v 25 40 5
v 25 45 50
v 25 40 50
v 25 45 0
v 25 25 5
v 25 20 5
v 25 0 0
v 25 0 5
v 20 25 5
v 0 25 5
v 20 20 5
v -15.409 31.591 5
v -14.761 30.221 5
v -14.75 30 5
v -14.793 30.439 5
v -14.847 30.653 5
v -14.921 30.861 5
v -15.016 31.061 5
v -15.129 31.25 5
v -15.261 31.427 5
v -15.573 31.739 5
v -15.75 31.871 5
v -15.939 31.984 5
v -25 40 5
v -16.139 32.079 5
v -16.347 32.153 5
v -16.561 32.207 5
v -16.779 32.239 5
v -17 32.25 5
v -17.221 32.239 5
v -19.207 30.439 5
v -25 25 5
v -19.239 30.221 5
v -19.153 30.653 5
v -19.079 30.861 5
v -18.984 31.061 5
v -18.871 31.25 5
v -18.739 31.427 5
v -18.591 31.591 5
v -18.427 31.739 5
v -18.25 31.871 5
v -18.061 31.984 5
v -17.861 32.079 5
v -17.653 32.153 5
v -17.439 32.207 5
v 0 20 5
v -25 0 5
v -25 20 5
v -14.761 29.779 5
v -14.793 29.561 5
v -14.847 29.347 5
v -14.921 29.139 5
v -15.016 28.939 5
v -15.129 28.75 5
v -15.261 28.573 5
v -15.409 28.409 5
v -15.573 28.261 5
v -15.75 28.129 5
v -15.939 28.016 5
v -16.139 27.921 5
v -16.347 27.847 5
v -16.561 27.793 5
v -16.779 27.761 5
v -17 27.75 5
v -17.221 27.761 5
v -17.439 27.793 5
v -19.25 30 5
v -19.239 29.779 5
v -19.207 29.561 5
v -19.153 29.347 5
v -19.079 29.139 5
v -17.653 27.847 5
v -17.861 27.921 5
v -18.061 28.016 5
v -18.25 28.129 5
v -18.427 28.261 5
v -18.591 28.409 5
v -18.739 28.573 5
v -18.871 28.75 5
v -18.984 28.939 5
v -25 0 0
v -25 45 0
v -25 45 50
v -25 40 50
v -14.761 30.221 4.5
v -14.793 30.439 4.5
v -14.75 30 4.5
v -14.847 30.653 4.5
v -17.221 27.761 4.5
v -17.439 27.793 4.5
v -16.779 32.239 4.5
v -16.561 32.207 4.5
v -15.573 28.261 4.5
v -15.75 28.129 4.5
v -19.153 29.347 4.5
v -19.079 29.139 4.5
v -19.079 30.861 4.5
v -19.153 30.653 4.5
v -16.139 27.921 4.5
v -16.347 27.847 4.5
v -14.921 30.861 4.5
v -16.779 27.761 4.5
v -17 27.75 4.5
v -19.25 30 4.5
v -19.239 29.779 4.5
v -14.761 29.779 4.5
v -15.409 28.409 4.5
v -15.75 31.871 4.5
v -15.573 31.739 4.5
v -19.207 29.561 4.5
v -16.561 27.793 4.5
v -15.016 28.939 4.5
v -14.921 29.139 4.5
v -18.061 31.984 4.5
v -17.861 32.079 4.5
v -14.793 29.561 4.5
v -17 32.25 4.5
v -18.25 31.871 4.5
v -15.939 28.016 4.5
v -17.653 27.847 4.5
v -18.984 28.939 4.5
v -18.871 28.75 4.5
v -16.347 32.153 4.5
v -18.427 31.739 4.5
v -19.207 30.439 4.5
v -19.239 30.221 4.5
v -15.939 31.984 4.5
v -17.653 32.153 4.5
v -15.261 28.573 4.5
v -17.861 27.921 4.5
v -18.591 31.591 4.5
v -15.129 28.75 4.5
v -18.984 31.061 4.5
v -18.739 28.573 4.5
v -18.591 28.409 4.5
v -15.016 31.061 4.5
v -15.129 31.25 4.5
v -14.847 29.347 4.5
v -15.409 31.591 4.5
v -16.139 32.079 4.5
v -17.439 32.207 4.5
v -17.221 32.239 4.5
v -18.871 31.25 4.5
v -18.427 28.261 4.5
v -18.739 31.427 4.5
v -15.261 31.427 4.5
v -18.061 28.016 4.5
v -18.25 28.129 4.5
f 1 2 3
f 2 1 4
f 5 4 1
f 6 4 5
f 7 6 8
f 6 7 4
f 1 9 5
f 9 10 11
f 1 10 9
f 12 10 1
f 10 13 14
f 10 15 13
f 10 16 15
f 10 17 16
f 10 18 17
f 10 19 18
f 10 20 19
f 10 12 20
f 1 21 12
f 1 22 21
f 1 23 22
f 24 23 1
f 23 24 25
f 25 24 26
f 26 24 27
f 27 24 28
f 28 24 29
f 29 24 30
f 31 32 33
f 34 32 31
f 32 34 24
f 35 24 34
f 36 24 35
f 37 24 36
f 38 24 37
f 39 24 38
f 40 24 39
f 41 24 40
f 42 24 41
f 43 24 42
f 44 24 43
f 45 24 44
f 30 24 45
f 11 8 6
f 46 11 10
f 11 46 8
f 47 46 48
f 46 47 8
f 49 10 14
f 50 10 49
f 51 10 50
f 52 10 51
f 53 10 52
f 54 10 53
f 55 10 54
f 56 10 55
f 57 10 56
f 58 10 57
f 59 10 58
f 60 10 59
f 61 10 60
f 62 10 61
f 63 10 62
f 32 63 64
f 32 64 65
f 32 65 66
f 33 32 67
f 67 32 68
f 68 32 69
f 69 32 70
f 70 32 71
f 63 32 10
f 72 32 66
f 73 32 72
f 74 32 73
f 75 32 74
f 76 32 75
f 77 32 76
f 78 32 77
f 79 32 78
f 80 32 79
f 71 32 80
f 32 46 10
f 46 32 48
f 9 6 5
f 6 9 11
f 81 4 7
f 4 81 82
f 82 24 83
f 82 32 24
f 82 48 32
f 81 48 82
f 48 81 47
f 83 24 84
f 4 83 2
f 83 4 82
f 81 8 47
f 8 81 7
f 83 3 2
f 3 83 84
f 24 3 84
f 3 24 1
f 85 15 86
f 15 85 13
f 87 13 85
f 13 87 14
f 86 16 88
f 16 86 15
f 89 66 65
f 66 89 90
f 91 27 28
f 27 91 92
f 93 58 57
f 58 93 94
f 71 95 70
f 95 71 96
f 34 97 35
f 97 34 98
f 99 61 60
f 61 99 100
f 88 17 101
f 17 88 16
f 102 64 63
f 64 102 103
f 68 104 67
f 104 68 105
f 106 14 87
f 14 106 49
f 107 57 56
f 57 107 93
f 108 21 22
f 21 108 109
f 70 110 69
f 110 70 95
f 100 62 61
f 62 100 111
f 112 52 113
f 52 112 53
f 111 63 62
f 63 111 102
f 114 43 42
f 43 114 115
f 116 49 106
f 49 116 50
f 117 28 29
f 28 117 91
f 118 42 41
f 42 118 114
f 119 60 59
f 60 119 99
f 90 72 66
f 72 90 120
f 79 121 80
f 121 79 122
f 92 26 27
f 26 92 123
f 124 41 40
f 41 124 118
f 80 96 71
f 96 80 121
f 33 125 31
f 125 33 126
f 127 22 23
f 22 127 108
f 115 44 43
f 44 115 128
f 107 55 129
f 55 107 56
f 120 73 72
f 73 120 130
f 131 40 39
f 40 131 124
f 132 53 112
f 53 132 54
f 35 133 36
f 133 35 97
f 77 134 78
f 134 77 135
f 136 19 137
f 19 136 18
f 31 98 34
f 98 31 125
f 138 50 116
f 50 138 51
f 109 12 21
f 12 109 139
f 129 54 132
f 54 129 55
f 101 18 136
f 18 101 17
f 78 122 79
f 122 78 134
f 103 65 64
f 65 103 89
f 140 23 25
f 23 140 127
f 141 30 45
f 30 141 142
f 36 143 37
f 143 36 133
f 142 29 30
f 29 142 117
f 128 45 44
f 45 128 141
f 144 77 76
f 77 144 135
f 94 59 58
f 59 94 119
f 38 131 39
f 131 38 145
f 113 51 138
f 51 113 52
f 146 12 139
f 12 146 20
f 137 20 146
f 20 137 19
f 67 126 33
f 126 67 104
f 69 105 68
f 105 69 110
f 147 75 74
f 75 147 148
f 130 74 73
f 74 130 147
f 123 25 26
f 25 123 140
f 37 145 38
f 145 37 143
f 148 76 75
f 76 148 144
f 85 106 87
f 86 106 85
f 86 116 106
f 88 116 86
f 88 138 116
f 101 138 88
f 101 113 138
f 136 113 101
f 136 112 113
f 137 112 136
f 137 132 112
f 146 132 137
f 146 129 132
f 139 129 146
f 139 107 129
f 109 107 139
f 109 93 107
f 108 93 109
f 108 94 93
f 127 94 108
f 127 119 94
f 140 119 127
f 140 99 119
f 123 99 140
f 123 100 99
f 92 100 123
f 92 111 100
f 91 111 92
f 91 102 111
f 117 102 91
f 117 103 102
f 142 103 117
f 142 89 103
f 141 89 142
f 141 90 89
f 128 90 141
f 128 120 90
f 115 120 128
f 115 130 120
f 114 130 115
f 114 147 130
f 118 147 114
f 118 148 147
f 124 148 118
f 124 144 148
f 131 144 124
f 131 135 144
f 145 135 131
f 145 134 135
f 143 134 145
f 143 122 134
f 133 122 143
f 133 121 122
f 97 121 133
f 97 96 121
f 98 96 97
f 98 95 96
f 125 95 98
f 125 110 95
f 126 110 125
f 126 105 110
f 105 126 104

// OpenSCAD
// L-shaped mounting bracket for NEMA 17 stepper motor
// Print orientation: base plate on bed, motor plate builds upward (+Z)

// ---------------- Parameters ----------------
plate_x       = 25;    // base plate half-width (X)
plate_y       = 45;    // base plate length (Y)
plate_t       = 5;     // base plate thickness (Z)

motor_h       = 50;    // motor plate height (Z)
motor_w       = 5;     // motor plate thickness (Y)

boss_d        = 23;    // motor boss hole diameter
boss_x        = 0;     // boss hole centre X
boss_z        = 28;    // boss hole centre Z

screw_d       = 3.4;   // M3 screw hole diameter
screw_pattern = 31;    // square pitch of screw holes
screw_count   = 4;     // number of screw holes

gusset_t      = 5;     // gusset thickness (X)
gusset_leg    = 20;    // right-triangle leg length (Y and Z)
gusset_x      = [-25, -20, 20, 25]; // gusset X positions (flush edges)

eps           = 0.5;   // cutter overshoot past faces
$fn           = 96;    // curve resolution

// ---------------- Model ----------------
difference() {
    union() {
        // Base plate
        translate([-plate_x, 0, 0])
            cube([plate_x * 2, plate_y, plate_t]);

        // Vertical motor plate
        translate([-plate_x, plate_y - motor_w, 0])
            cube([plate_x * 2, motor_w, motor_h]);
    }

    // Base plate through-holes (M4)
    for (h = [plate_t + eps, plate_t - eps])
        translate([-17, 30, h])
            cylinder(d = 4.5, h = 2 * eps, $fn = 64);

    // Motor boss hole (along Y) and screw holes (square pattern)
    translate([boss_x, plate_y - motor_w - eps, boss_z])
        rotate([90, 0, 0]) {
            difference() {
                cylinder(d = boss_d, h = motor_w + 2 * eps);
                for (i = [0 : screw_count - 1])
                    for (j = [0 : screw_count - 1])
                        translate([(i - (screw_count - 1) / 2) * screw_pattern,
                                   (j - (screw_count - 1) / 2) * screw_pattern,
                                   0])
                            cylinder(d = screw_d, h = motor_w + 2 * eps);
            }
        }

    // Triangular gussets, flush with left and right edges
    for (gx = gusset_x)
        translate([gx, plate_y - gusset_leg, gusset_t])
            rotate([90, 0, 0])
                linear_extrude(height = gusset_t)
                    polygon(points = [
                        [0, 0],
                        [gusset_leg, 0],
                        [0, gusset_leg]
                    ]);
}
